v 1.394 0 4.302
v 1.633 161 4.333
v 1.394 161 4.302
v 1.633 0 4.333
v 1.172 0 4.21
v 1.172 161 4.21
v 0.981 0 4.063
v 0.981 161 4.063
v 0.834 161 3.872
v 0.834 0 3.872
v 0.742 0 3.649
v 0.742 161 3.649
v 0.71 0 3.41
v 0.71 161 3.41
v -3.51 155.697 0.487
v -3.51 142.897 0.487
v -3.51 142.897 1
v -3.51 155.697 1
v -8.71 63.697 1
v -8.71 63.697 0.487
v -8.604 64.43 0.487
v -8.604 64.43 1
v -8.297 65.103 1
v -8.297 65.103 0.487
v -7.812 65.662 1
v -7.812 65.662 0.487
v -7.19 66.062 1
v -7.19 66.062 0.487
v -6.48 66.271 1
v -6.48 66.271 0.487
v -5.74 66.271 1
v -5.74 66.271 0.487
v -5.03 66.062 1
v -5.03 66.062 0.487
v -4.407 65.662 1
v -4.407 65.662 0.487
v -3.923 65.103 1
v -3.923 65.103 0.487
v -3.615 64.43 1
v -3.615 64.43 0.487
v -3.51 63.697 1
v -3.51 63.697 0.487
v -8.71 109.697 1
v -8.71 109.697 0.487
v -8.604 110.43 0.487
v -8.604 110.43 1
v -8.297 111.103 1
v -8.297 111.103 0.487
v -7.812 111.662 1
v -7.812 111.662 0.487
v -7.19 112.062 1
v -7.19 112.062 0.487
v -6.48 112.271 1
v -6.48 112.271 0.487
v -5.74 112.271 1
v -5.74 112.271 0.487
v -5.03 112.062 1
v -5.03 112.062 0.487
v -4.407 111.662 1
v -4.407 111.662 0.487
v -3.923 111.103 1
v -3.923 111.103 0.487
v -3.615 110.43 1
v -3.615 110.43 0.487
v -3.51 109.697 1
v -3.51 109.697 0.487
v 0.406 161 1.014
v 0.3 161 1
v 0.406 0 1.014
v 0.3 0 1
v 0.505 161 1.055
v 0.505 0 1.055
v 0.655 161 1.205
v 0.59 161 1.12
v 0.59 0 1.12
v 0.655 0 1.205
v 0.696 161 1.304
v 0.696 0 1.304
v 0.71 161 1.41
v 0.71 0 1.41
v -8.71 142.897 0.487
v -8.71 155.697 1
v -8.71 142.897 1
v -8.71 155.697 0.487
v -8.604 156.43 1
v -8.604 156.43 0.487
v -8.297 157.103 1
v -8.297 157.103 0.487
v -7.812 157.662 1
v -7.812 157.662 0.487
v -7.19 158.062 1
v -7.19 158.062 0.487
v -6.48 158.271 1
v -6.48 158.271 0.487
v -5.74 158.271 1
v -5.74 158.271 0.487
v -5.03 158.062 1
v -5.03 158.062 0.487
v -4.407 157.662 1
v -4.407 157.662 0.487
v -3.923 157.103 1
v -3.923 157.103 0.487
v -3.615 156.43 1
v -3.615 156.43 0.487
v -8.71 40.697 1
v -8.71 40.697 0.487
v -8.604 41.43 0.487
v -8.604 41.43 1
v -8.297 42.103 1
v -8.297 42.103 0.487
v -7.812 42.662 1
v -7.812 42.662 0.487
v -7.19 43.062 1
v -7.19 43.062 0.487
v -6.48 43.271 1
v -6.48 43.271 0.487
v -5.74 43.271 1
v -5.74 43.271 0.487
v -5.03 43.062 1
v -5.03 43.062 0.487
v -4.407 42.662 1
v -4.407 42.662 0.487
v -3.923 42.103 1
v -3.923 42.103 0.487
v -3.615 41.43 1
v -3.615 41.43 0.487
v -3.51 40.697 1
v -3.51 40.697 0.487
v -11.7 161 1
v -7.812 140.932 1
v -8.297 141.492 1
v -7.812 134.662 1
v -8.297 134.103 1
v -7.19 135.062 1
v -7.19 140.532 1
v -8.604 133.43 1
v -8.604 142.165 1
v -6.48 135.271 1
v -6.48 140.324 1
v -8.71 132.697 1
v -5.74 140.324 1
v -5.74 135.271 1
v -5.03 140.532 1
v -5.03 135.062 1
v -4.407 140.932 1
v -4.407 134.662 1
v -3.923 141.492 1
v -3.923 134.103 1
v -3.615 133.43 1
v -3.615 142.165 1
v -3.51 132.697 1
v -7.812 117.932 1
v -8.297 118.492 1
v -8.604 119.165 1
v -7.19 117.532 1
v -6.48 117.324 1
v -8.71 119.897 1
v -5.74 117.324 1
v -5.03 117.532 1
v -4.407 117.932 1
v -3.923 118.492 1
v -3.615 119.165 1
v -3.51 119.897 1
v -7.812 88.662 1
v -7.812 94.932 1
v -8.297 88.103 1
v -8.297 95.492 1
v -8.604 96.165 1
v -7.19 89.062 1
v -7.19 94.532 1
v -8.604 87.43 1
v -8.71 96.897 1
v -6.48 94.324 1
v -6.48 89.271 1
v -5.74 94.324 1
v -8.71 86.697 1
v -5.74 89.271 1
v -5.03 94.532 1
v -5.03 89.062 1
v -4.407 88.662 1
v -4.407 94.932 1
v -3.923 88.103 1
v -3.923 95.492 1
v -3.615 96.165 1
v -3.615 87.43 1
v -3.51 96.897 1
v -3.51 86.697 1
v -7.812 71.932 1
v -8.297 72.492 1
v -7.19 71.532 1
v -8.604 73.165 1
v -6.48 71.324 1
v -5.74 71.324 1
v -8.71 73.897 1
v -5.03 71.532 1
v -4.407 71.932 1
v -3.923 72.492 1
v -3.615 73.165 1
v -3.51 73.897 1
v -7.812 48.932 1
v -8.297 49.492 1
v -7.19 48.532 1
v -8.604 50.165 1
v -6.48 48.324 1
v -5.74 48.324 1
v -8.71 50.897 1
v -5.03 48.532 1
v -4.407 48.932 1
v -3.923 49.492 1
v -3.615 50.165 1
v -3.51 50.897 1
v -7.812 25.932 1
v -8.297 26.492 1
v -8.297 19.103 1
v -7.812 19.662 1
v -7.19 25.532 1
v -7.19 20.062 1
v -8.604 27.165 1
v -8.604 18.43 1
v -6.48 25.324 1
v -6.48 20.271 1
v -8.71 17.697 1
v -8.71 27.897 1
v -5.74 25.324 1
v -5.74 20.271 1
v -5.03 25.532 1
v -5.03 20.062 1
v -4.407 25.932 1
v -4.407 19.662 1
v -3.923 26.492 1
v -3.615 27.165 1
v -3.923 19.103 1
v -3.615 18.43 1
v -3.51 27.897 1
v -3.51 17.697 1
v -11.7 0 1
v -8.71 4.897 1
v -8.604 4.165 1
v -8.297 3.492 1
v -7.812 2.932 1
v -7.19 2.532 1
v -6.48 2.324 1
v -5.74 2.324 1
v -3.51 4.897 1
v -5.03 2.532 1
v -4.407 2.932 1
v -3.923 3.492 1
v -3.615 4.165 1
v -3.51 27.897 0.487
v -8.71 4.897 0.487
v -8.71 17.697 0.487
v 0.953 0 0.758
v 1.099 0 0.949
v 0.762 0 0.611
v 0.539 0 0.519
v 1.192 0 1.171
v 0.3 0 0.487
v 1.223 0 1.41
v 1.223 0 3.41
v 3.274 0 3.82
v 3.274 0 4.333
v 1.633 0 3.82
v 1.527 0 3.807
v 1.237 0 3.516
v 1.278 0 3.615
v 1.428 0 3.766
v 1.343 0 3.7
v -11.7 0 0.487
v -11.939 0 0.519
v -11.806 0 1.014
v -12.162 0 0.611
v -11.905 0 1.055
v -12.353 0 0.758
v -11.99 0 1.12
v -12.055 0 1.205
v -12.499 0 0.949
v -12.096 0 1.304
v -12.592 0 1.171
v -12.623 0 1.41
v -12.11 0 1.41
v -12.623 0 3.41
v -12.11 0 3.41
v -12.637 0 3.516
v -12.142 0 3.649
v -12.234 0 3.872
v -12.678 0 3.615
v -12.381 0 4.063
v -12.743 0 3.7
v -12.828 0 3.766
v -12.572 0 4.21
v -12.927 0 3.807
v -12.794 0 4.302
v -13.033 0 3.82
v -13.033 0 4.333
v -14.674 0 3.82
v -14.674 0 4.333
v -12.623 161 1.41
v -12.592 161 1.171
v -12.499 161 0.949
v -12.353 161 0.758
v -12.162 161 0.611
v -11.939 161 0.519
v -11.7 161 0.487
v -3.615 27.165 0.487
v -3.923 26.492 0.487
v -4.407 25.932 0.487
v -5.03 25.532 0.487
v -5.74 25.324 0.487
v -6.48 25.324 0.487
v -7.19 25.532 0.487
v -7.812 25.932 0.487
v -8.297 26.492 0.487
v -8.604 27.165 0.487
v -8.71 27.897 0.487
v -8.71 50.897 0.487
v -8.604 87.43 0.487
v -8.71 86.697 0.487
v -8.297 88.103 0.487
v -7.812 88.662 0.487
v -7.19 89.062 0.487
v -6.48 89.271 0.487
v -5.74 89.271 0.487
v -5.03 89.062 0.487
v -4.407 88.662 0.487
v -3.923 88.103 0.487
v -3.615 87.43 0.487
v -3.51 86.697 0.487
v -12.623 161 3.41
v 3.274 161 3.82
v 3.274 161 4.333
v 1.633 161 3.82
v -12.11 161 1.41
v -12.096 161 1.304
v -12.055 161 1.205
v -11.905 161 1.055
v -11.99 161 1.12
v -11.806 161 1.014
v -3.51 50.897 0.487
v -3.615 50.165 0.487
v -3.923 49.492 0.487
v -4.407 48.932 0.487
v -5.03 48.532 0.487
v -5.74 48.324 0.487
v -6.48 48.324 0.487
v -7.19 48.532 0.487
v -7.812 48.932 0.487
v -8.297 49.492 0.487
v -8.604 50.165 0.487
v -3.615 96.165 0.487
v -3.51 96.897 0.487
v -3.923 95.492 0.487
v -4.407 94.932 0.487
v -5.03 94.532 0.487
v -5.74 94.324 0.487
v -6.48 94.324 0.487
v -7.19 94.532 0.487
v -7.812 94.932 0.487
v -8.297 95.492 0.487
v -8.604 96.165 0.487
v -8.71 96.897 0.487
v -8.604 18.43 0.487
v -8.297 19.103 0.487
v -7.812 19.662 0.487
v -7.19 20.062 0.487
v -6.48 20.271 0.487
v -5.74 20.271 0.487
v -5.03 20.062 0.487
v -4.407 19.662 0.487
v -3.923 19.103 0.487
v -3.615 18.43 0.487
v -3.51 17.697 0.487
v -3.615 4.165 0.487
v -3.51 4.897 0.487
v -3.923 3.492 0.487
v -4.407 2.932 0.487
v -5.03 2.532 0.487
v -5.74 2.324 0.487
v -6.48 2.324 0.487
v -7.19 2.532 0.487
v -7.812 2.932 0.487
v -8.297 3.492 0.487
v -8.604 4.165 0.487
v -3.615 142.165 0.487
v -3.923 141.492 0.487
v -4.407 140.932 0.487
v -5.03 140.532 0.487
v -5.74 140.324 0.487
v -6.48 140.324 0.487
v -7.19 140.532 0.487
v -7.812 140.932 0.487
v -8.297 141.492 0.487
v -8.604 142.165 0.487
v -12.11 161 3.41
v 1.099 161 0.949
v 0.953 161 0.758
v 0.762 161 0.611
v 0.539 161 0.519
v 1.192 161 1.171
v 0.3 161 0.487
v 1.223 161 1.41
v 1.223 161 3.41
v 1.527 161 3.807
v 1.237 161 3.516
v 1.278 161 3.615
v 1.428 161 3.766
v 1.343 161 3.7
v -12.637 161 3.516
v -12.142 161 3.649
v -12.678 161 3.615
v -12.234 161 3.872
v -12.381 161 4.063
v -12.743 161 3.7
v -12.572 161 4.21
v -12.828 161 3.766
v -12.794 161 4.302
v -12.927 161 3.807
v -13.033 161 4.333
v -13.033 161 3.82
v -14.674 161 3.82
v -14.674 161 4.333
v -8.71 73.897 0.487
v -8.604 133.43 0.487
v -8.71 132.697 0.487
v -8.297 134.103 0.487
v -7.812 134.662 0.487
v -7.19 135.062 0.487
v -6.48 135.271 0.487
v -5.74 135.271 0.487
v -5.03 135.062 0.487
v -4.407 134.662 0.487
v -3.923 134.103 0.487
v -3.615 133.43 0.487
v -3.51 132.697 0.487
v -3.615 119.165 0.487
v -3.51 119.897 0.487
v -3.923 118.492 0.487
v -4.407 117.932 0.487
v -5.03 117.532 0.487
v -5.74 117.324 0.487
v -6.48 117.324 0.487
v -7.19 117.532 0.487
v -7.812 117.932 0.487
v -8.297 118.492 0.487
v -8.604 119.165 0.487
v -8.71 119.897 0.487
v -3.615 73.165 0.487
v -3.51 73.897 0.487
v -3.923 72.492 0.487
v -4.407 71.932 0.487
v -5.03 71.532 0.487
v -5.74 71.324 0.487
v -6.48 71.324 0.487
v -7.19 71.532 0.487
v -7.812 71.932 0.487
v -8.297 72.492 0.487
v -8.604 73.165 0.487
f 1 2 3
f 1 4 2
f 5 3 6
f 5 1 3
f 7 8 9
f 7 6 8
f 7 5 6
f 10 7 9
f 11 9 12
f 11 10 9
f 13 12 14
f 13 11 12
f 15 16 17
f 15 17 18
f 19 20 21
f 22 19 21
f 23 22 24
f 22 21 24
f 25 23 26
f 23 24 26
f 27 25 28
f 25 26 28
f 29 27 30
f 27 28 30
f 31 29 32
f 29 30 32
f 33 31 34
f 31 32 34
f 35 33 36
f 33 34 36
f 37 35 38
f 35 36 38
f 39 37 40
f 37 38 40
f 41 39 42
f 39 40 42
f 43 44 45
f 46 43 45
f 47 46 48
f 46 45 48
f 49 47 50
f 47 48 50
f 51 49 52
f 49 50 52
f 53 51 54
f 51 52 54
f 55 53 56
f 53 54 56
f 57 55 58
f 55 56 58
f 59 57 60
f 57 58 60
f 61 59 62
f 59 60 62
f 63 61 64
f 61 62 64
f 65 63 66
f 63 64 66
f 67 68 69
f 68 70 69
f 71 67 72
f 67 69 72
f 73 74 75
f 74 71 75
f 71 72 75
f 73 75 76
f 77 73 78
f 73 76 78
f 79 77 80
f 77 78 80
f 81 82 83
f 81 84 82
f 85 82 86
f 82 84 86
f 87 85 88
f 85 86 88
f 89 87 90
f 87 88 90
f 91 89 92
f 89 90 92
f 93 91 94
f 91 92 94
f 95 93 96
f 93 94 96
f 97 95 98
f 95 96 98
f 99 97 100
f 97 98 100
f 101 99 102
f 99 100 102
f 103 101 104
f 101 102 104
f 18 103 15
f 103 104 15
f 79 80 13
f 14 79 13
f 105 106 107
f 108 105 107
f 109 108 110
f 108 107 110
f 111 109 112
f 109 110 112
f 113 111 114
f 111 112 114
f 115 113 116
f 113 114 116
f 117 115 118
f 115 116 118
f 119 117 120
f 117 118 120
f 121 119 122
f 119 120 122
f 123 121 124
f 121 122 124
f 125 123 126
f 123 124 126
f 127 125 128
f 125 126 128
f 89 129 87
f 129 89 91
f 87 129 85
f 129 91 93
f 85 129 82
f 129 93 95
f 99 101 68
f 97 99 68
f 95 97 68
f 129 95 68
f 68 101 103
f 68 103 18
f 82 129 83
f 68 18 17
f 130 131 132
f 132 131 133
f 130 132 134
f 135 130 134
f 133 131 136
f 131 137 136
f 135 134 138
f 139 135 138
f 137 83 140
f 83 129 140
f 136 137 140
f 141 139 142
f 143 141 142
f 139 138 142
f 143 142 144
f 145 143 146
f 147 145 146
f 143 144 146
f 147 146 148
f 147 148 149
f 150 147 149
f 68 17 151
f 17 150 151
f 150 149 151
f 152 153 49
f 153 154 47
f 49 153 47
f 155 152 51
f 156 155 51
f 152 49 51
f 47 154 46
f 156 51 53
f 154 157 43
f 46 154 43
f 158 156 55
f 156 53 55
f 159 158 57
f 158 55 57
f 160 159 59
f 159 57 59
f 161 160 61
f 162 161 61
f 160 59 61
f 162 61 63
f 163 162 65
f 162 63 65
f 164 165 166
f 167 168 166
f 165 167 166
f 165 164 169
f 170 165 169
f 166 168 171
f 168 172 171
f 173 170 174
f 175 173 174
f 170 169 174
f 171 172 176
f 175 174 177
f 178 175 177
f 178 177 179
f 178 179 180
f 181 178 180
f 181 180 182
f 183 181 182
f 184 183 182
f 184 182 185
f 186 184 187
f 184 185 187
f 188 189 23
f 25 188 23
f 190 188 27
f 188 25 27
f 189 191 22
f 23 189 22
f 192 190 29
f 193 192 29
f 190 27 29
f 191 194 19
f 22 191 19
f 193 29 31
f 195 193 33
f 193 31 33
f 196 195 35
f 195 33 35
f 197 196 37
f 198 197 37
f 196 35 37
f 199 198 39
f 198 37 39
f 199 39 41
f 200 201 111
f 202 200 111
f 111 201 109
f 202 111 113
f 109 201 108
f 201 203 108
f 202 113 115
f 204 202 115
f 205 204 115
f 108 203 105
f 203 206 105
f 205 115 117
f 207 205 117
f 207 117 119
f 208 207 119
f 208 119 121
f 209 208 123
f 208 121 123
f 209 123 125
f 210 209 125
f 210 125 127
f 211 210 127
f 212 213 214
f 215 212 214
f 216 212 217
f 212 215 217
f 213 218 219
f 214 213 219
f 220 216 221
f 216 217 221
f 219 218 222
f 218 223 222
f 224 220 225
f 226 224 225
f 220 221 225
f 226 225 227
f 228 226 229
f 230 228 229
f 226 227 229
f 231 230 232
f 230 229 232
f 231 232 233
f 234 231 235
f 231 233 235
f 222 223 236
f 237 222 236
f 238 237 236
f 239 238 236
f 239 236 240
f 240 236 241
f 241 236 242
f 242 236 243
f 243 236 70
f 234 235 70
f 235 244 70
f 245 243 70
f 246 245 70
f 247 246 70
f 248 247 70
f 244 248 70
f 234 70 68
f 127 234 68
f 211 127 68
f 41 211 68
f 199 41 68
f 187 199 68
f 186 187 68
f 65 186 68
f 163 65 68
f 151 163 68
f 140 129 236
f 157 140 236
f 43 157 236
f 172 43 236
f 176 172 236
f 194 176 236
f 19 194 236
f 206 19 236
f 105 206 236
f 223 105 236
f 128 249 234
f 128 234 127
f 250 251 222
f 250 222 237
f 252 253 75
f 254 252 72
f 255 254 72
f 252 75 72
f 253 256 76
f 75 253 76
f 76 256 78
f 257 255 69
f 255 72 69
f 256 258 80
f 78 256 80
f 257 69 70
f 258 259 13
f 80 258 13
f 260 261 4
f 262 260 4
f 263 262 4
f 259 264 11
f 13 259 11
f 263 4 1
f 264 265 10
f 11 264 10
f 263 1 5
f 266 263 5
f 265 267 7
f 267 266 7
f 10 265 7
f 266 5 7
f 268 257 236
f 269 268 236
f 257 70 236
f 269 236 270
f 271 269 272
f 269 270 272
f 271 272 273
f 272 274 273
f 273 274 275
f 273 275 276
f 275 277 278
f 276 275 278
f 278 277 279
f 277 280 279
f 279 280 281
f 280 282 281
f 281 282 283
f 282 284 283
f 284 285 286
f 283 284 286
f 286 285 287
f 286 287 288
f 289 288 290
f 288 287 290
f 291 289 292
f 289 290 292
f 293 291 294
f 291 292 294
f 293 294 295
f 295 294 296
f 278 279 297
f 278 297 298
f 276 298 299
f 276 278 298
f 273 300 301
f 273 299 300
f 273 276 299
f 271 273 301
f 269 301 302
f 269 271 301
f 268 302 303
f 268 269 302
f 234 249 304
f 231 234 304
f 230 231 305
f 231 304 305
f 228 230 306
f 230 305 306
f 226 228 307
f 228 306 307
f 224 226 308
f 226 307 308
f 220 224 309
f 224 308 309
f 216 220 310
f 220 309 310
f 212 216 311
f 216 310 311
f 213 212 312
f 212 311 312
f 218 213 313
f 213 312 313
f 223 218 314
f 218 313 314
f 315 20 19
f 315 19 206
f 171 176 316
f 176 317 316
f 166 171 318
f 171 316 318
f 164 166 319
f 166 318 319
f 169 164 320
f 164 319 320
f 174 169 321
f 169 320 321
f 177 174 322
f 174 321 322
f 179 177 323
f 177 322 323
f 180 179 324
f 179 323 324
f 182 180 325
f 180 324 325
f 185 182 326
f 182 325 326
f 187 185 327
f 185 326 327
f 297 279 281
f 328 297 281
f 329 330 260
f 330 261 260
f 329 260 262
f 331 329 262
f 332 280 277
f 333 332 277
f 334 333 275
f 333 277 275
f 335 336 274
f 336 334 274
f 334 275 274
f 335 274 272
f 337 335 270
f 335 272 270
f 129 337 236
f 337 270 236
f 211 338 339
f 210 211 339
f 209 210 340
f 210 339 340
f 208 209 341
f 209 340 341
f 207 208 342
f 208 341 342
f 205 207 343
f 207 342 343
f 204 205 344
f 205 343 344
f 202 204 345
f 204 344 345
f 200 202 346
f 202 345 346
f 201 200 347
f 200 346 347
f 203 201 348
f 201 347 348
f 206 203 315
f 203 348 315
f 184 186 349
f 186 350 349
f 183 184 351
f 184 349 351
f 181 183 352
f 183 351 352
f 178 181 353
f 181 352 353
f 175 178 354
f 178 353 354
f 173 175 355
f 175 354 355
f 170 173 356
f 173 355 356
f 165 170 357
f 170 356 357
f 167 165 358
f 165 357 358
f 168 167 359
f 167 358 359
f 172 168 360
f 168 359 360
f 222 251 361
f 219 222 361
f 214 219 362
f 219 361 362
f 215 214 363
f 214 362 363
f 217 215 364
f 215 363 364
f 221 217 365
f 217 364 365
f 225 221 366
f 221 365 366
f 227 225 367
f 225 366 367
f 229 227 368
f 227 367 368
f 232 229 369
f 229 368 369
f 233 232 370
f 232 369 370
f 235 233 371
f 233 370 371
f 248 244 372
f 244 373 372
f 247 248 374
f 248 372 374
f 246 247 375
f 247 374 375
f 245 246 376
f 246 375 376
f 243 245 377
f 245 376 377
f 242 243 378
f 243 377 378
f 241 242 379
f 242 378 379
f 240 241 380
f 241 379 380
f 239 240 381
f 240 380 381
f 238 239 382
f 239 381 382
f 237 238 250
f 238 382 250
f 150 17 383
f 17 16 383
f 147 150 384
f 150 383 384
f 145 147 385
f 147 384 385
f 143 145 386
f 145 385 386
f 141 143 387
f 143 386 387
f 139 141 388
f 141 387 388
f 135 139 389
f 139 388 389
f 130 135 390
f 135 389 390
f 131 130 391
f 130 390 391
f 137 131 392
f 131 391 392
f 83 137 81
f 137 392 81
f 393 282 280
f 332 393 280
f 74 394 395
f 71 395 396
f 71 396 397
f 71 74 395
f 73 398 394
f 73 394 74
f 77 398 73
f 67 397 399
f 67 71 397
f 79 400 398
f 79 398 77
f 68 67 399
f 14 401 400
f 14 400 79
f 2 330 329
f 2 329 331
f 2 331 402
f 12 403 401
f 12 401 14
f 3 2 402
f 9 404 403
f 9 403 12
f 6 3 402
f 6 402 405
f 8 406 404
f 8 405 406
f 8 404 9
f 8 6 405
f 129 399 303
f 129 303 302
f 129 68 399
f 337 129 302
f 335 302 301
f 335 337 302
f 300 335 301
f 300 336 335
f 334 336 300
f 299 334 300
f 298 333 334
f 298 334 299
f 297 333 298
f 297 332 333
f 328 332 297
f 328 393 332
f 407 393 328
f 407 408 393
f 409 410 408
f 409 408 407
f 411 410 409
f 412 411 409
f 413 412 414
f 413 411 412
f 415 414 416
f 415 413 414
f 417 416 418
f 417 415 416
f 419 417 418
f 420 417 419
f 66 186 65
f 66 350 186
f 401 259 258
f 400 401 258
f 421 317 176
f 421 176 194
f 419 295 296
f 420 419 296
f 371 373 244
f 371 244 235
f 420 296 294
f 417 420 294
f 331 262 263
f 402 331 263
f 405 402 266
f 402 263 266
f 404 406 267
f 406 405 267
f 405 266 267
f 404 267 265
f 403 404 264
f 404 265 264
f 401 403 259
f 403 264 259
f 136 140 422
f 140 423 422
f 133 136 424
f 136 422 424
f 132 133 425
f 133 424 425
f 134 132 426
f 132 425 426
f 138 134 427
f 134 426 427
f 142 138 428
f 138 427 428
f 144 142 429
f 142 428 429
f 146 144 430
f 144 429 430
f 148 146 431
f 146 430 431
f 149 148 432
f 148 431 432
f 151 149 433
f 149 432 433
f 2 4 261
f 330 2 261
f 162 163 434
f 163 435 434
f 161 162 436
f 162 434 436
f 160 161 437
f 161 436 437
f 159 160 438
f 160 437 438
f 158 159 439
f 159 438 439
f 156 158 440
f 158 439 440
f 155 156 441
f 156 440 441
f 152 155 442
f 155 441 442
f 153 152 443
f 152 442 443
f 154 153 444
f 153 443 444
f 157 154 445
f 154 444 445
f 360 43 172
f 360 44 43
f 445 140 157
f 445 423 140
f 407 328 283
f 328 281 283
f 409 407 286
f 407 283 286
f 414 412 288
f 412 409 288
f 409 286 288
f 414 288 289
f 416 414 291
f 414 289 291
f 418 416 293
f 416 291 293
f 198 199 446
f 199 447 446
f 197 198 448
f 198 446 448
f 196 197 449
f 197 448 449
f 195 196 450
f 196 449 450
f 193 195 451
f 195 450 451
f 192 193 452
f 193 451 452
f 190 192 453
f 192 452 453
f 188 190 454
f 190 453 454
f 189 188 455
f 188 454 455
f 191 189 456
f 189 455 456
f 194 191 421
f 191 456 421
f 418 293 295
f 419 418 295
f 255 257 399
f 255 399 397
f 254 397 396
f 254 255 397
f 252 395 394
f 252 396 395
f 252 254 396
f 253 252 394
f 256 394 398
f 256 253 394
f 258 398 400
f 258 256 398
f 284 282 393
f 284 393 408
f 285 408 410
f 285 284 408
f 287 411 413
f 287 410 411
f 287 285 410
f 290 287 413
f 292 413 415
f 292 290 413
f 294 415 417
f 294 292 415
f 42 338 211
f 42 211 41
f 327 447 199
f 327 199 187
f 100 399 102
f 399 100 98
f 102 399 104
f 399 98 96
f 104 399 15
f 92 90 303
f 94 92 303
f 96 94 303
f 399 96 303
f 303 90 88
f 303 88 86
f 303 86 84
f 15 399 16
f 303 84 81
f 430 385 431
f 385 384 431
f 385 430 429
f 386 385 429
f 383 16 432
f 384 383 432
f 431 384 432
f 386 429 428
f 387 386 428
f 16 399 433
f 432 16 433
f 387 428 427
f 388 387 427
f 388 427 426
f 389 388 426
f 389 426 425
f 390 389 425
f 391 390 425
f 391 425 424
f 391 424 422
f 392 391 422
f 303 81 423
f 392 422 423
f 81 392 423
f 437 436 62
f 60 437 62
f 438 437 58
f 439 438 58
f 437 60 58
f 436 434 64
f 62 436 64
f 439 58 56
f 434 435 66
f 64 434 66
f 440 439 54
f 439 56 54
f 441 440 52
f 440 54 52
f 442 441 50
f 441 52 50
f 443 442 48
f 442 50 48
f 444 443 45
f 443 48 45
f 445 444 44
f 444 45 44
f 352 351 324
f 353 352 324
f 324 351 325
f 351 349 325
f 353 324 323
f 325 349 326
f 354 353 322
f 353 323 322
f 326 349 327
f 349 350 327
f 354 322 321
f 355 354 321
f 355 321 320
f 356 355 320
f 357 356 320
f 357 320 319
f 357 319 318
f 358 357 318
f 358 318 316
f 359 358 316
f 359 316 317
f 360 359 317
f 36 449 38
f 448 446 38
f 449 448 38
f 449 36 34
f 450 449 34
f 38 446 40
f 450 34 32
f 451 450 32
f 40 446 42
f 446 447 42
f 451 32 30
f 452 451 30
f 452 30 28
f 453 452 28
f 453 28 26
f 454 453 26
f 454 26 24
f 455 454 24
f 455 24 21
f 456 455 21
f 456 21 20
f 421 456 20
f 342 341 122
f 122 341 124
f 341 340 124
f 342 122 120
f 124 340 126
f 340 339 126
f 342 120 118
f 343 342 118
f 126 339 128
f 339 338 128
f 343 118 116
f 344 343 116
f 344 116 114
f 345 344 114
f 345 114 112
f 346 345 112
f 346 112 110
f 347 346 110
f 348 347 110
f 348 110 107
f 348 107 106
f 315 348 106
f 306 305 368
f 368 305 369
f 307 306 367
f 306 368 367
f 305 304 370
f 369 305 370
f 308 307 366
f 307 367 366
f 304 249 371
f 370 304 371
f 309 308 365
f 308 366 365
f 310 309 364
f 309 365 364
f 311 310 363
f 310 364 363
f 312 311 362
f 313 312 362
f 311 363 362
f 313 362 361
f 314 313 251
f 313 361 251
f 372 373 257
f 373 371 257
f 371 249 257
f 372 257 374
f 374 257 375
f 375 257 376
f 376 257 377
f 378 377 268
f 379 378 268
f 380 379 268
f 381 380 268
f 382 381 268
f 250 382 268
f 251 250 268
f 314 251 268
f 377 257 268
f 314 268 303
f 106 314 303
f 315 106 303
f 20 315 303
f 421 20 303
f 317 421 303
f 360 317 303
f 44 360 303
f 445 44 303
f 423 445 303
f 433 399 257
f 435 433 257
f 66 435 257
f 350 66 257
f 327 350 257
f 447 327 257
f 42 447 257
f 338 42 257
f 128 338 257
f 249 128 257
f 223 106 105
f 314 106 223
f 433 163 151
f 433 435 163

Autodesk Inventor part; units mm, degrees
sketch "Sketch_2" plane through (0, 0, 0) normal (0, 1, 0) x (-1, 0, 0)
  line L0 (14.6744, 3.8205) -> (14.6744, 4.3333)
  line L1 (14.6744, 4.3333) -> (13.0333, 4.3333)
  arc A0 (13.0333, 4.3333) -> (12.1103, 3.4103) centre (13.0333, 3.4103) ccw
  line L2 (12.1103, 3.4103) -> (12.1103, 1.4103)
  arc A1 (11.7, 1) -> (12.1103, 1.4103) centre (11.7, 1.4103) ccw
  line L3 (11.7, 1) -> (-0.3, 1)
  arc A2 (-0.7103, 1.4103) -> (-0.3, 1) centre (-0.3, 1.4103) ccw
  line L4 (-0.7103, 1.4103) -> (-0.7103, 3.4103)
  arc A3 (-0.7103, 3.4103) -> (-1.6333, 4.3333) centre (-1.6333, 3.4103) ccw
  line L5 (-1.6333, 4.3333) -> (-3.2744, 4.3333)
  line L6 (-3.2744, 4.3333) -> (-3.2744, 3.8205)
  line L7 (-3.2744, 3.8205) -> (-1.6333, 3.8205)
  arc A4 (-1.2231, 3.4103) -> (-1.6333, 3.8205) centre (-1.6333, 3.4103) ccw
  line L8 (-1.2231, 3.4103) -> (-1.2231, 1.4103)
  arc A5 (-1.2231, 1.4103) -> (-0.3, 0.4872) centre (-0.3, 1.4103) ccw
  line L9 (-0.3, 0.4872) -> (11.7, 0.4872)
  arc A6 (11.7, 0.4872) -> (12.6231, 1.4103) centre (11.7, 1.4103) ccw
  line L10 (12.6231, 1.4103) -> (12.6231, 3.4103)
  arc A7 (13.0333, 3.8205) -> (12.6231, 3.4103) centre (13.0333, 3.4103) ccw
  line L11 (13.0333, 3.8205) -> (14.6744, 3.8205)
  dimension "d13" = 12
extrude "Extrusion1" add sketch "Sketch_2" along normal blind 161
sketch "Sketch_6" plane through (0, 0, 0) normal (0, 0, 1) x (1, 0, 0)
  arc A0 (-8.7098, 4.8974) -> (-3.5098, 4.8974) centre (-6.1098, 4.8974) ccw
  line L0 (-3.5098, 4.8974) -> (-3.5098, 17.6974)
  arc A1 (-3.5098, 17.6974) -> (-8.7098, 17.6974) centre (-6.1098, 17.6974) ccw
  line L1 (-8.7098, 17.6974) -> (-8.7098, 4.8974)
extrude "Extrusion2" cut sketch "Sketch_6" along normal blind 1
pattern_linear "Rectangular Pattern1" count 80 spacing 23 along (0, 1, 0) of "Extrusion2"
properties part number "PP0735H(1)"
